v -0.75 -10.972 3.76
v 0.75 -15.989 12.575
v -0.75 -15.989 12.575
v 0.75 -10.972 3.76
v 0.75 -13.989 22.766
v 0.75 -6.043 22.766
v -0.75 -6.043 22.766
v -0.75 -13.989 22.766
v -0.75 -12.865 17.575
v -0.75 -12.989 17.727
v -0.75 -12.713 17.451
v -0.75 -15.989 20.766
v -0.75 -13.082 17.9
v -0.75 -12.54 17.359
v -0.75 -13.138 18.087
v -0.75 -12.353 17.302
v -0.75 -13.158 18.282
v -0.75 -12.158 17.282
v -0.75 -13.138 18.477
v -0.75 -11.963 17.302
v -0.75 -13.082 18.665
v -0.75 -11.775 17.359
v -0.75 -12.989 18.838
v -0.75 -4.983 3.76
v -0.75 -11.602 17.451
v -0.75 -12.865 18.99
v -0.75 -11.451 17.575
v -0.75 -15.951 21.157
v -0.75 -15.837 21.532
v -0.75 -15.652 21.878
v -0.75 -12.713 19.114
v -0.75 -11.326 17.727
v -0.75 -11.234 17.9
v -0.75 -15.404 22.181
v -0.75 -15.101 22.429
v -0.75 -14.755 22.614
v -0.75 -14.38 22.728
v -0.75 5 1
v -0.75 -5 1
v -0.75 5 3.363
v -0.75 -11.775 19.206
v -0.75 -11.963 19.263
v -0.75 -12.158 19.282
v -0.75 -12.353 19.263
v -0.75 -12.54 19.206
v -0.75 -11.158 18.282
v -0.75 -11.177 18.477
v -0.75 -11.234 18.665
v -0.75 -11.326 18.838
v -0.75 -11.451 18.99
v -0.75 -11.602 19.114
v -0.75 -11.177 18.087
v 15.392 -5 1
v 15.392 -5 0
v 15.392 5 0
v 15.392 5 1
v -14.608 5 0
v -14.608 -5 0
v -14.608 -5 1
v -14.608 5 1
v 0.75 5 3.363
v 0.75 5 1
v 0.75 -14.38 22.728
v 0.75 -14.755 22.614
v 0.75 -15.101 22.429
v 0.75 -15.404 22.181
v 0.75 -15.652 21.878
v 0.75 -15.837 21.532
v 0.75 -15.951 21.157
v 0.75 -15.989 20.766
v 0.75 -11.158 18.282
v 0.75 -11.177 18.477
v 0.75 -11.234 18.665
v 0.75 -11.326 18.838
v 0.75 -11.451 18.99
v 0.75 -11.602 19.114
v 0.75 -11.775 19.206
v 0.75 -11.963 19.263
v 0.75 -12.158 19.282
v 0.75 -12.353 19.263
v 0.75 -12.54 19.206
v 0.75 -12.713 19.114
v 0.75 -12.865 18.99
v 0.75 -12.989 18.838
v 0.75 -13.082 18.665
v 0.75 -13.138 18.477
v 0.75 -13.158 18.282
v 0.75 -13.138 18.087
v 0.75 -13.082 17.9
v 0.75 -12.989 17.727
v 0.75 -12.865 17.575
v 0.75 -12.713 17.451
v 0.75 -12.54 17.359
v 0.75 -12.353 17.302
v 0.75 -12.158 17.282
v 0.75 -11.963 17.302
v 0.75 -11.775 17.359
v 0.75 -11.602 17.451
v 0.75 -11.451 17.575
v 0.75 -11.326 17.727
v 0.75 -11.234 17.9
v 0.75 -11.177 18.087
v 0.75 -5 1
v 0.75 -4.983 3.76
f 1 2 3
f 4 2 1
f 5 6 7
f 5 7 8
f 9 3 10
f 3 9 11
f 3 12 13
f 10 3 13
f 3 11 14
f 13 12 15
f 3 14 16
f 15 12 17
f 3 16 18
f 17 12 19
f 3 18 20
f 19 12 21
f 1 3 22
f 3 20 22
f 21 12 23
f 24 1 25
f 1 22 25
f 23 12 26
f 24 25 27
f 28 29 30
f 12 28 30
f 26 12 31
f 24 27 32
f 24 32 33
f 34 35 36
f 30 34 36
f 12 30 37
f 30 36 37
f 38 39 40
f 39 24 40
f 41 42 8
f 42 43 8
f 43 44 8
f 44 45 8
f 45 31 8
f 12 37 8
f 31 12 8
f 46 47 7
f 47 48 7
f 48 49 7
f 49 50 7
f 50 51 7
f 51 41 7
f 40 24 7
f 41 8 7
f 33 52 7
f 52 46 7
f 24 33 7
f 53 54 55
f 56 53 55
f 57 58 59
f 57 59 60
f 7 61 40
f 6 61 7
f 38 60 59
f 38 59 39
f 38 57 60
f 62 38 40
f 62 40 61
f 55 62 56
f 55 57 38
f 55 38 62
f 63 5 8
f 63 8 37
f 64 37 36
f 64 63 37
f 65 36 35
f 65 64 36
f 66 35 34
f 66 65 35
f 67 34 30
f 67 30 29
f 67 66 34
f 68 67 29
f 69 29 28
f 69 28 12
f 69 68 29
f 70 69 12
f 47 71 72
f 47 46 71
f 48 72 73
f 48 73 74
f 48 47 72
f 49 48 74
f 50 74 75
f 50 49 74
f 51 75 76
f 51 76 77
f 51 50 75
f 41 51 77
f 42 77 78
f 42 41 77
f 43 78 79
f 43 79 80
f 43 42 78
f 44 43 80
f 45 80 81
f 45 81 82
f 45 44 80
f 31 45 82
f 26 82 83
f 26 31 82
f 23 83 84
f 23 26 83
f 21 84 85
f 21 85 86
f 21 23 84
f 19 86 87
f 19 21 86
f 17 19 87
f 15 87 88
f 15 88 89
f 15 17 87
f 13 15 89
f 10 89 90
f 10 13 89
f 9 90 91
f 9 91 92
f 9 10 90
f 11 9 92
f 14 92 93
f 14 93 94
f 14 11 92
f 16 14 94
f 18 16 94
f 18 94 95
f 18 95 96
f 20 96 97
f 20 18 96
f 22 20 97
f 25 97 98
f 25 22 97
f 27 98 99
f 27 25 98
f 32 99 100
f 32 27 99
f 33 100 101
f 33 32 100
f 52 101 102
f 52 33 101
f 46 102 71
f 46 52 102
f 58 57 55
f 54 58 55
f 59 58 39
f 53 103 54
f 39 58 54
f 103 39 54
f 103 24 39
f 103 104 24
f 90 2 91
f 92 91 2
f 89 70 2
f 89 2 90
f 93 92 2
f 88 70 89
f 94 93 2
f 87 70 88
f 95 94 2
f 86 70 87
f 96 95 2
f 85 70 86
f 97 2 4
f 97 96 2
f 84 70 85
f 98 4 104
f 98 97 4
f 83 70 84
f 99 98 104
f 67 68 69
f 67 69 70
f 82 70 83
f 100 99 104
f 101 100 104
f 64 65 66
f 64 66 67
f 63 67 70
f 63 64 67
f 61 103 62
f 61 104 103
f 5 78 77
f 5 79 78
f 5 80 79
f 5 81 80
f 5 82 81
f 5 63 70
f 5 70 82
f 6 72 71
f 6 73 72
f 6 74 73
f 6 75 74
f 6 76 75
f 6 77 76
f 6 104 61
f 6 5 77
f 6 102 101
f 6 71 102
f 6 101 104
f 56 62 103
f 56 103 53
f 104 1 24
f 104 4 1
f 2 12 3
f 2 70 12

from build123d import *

# Parameters (mm, degrees)
F0_W     = 30
F0_H     = 10
F1_DEPTH = 1
F2_R     = 1
F3_DEPTH = 0.75


# Not quite as in the source:
# - a feature of the source that left no trace in its solid (it failed there, or was rolled back) is left out


with BuildPart() as f1:
    # F0 (on Top) → F1 (new body)
    with BuildSketch(Plane.XY):
        with Locations((0.392307792, 0)):
            Rectangle(F0_W, F0_H)
    extrude(amount=F1_DEPTH)

    # F2 (on Right) → F3 (join, symmetric)
    with BuildSketch(Plane.YZ):
        with BuildLine():
            Line((-5, 1), (5, 1))
            Line((5, 1), (5, 3.3628055826))
            Line((5, 3.3628055826), (-6.0430504382, 22.7664429694))
            Line((-6.0430504382, 22.7664429694), (-13.9894526005, 22.7664429694))
            ThreePointArc((-13.9894526005, 22.7664429694), (-15.4036661629, 22.1806565318), (-15.9894526005, 20.7664429694))
            Line((-15.9894526005, 20.7664429694), (-15.9894526005, 12.5754568726))
            Line((-15.9894526005, 12.5754568726), (-10.9724997157, 3.7602173598))
            Line((-10.9724997157, 3.7602173598), (-4.9831885844, 3.7602173598))
            Line((-4.9831885844, 3.7602173598), (-5, 1))
        make_face()
        with Locations((-12.1576432139, 18.2824078947)):
            Circle(F2_R, mode=Mode.SUBTRACT)
    extrude(amount=F3_DEPTH, both=True)


solid = f1.part
